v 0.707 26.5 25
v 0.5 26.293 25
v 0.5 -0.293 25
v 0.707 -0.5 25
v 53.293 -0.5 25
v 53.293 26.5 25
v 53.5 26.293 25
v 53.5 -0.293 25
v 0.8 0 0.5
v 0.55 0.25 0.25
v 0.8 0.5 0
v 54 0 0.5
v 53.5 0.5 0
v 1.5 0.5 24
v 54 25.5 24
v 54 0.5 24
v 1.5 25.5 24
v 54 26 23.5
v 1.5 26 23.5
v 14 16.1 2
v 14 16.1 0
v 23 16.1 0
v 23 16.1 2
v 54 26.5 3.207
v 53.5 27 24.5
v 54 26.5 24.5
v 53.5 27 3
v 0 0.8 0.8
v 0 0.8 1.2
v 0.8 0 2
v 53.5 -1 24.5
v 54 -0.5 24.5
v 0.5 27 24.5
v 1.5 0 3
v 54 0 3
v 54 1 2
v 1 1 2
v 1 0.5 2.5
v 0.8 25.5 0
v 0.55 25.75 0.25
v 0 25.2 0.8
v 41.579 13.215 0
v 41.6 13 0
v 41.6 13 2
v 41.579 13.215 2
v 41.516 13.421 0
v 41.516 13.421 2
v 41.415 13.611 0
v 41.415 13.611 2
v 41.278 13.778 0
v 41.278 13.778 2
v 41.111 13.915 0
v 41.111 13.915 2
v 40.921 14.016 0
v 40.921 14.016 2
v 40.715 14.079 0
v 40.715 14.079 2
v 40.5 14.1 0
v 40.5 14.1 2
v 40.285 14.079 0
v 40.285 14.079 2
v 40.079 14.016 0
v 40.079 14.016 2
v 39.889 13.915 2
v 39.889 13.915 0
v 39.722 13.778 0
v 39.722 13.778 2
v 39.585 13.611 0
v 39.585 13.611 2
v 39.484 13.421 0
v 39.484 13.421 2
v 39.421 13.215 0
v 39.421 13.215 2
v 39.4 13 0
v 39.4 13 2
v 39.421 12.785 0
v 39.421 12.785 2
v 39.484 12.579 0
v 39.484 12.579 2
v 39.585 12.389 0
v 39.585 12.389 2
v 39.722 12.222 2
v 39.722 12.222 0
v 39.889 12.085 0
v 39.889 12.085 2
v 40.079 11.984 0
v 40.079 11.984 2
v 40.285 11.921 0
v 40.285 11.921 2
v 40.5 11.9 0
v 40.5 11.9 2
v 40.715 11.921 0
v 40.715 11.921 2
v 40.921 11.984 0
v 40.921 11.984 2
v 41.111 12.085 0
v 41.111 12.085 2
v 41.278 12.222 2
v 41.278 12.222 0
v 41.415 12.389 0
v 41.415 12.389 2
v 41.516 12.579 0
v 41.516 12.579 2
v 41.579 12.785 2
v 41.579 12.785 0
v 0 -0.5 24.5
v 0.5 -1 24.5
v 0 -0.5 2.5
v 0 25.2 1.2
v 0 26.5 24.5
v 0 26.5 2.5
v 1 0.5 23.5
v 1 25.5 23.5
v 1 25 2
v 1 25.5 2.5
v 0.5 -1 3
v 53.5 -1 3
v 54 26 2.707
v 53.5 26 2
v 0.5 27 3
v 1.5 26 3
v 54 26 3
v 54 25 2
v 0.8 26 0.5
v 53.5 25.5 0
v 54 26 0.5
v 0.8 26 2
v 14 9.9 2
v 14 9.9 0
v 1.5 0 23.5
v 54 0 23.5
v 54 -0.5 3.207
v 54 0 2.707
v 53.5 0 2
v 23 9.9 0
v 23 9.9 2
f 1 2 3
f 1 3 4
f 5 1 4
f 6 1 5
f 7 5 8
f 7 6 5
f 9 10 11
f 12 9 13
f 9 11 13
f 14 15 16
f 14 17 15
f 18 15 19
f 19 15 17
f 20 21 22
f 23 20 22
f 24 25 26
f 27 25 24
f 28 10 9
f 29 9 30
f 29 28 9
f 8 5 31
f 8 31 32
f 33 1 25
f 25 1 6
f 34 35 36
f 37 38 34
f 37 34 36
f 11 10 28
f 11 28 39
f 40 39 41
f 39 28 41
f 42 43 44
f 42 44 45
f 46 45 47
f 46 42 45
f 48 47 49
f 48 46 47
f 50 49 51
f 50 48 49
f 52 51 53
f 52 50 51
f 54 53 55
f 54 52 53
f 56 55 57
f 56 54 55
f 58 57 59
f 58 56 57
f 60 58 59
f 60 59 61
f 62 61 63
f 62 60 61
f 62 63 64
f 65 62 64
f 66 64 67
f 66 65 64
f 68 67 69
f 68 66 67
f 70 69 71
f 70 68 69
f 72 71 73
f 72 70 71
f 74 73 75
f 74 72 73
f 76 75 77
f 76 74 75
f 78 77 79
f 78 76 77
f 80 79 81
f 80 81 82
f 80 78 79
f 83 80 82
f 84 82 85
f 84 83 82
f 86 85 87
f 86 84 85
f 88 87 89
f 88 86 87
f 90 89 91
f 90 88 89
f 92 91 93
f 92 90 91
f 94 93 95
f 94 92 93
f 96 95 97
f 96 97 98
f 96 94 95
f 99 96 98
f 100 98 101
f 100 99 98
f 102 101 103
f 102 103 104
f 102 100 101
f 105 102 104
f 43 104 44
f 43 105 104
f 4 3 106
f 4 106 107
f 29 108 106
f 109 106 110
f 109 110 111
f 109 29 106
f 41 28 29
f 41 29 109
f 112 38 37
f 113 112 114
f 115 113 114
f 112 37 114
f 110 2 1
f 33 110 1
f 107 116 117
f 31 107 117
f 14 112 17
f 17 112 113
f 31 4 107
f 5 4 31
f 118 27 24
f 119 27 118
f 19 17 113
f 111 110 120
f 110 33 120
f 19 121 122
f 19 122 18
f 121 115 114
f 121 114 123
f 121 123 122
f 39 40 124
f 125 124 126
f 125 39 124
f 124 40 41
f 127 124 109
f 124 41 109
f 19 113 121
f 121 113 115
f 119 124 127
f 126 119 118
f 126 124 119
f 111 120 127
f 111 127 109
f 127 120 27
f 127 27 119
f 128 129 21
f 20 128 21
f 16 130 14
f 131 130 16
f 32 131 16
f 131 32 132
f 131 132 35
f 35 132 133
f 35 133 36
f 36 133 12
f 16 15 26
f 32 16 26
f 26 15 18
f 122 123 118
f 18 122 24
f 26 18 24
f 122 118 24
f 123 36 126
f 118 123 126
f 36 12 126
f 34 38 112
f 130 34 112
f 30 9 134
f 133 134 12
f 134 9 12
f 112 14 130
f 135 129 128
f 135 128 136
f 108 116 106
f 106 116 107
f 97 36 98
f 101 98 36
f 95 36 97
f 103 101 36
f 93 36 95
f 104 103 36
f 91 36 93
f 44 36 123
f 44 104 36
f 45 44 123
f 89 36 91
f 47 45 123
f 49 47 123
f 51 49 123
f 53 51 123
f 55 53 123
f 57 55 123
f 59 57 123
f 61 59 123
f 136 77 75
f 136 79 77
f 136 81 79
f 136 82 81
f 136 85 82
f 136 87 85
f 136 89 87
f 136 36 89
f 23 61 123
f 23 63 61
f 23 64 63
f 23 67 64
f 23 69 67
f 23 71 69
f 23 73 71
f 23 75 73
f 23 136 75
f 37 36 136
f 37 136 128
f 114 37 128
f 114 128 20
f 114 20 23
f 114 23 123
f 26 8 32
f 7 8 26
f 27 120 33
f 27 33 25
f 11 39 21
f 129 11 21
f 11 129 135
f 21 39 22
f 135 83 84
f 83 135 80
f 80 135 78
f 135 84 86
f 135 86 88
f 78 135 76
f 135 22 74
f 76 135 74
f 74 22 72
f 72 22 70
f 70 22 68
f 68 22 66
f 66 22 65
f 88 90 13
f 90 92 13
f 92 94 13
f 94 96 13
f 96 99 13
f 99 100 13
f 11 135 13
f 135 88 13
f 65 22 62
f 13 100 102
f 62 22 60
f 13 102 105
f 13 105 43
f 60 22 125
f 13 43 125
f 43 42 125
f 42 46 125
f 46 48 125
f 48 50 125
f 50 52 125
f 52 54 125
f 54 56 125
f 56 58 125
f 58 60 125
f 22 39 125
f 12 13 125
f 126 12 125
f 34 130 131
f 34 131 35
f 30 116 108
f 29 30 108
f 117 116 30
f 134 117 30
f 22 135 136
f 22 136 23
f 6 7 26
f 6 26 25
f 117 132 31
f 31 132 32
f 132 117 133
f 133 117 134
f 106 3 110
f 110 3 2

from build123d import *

# Parameters (mm, degrees)
SKETCH_W        = 54
SKETCH_H        = 26
SKETCH_R        = 1.1
SKETCH_W_2      = 9
SKETCH_H_2      = 6.2
PAD_DEPTH       = 2
SKETCH001_W     = 54
SKETCH001_H     = 28
SKETCH001_W_2   = 52
SKETCH001_H_2   = 26
PAD001_DEPTH    = 10
PAD002_DEPTH    = 52
POCKET_DEPTH    = 54.001
SKETCH004_W     = 54
SKETCH004_H     = 28
SKETCH004_W_2   = 52
SKETCH004_H_2   = 26
PAD003_DEPTH    = 12
SKETCH005_W     = 54
SKETCH005_H     = 28
PAD004_DEPTH    = 1
POCKET001_DEPTH = 5
CHAMFER_SIZE    = 0.5
CHAMFER001_SIZE = 0.5
CHAMFER002_SIZE = 0.5
CHAMFER003_SIZE = 0.8
CHAMFER004_SIZE = 0.5


with BuildPart() as part:
    # Sketch → Pad (new body)
    with BuildSketch(Plane.XY):
        with Locations((27, 13)):
            Rectangle(SKETCH_W, SKETCH_H)
        with Locations((40.5, 13)):
            Circle(SKETCH_R, mode=Mode.SUBTRACT)
        with Locations((18.5, 13)):
            Rectangle(SKETCH_W_2, SKETCH_H_2, mode=Mode.SUBTRACT)
    extrude(amount=PAD_DEPTH)

    # Sketch001 (on Face11 of Pad) → Pad001 (join)
    with BuildSketch(Plane.XY.offset(2)):
        with Locations((27, 13)):
            Rectangle(SKETCH001_W, SKETCH001_H)
        with Locations((27, 13)):
            Rectangle(SKETCH001_W_2, SKETCH001_H_2, mode=Mode.SUBTRACT)
    extrude(amount=PAD001_DEPTH)

    # Sketch002 (on Face22 of Pad001) → Pad002 (join)
    with BuildSketch(Plane.YZ.offset(1)):
        Polygon((0, 2), (0, 3), (1, 2), align=None)
        Polygon((26, 2), (26, 3), (25, 2), align=None)
    extrude(amount=PAD002_DEPTH)

    # Sketch003 (on Face8 of Pad002) → Pocket (cut, through all)
    with BuildSketch(Plane.YZ.offset(54)):
        Polygon((-1, 2), (-1, 3), (0, 2), align=None)
        Polygon((27, 2), (27, 3), (26, 2), align=None)
    extrude(amount=-POCKET_DEPTH, mode=Mode.SUBTRACT)

    # Sketch004 (on Face17 of Pocket) → Pad003 (join)
    with BuildSketch(Plane.XY.offset(12)):
        with Locations((27, 13)):
            Rectangle(SKETCH004_W, SKETCH004_H)
        with Locations((27, 13)):
            Rectangle(SKETCH004_W_2, SKETCH004_H_2, mode=Mode.SUBTRACT)
    extrude(amount=PAD003_DEPTH)

    # Sketch005 (on Face22 of Pad003) → Pad004 (join)
    with BuildSketch(Plane.XY.offset(24)):
        with Locations((27, 13)):
            Rectangle(SKETCH005_W, SKETCH005_H)
    extrude(amount=PAD004_DEPTH)

    # Sketch006 (on Face26 of Pad004) → Pocket001 (cut)
    with BuildSketch(Plane(origin=(53, 0, 0), x_dir=(0, -1, 0), z_dir=(-1, 0, 0))):
        Polygon((-26, 24), (0, 24), (0, 3), (-1, 2), (-25, 2), (-26, 3), align=None)
    extrude(amount=-POCKET001_DEPTH, mode=Mode.SUBTRACT)

    # Chamfer
    chamfer_edges = [part.edges().sort_by_distance(p)[0] for p in [
        (54, -1, 24.5),
        (54, -1, 18),
        (54, -1, 7.5),
        (54, 27, 24.5),
        (54, 27, 18),
        (54, 27, 7.5),
        (54, -0.5, 2.5),
        (54, 26.5, 2.5),
        (0, 27, 7.5),
        (0, 27, 18),
        (0, 27, 24.5),
        (0, -1, 7.5),
        (0, -1, 18),
        (0, -1, 24.5),
    ]]
    chamfer(chamfer_edges, length=CHAMFER_SIZE)

    # Chamfer001
    chamfer001_edges = [part.edges().sort_by_distance(p)[0] for p in [
        (27, 27, 25),
        (0.25, 26.75, 25),
        (0, 13, 25),
        (0.25, -0.75, 25),
        (27, -1, 25),
        (53.75, -0.75, 25),
        (54, 13, 25),
        (53.75, 26.75, 25),
    ]]
    chamfer(chamfer001_edges, length=CHAMFER001_SIZE)

    # Chamfer002
    chamfer002_edges = [part.edges().sort_by_distance(p)[0] for p in [
        (27, 0, 24),
        (27, 26, 24),
        (1, 13, 24),
        (1, 26, 18),
        (1, 26, 7.5),
        (1, 0, 7.5),
        (1, 0, 18),
    ]]
    chamfer(chamfer002_edges, length=CHAMFER002_SIZE)

    # Chamfer003
    chamfer003_edges = [part.edges().sort_by_distance(p)[0] for p in [
        (0, 0, 1),
        (0, 13, 0),
        (0, 26, 1),
    ]]
    chamfer(chamfer003_edges, length=CHAMFER003_SIZE)

    # Chamfer004
    chamfer004_edges = [part.edges().sort_by_distance(p)[0] for p in [
        (27.4, 0, 0),
        (54, 13, 0),
        (27.4, 26, 0),
    ]]
    chamfer(chamfer004_edges, length=CHAMFER004_SIZE)


solid = part.part
